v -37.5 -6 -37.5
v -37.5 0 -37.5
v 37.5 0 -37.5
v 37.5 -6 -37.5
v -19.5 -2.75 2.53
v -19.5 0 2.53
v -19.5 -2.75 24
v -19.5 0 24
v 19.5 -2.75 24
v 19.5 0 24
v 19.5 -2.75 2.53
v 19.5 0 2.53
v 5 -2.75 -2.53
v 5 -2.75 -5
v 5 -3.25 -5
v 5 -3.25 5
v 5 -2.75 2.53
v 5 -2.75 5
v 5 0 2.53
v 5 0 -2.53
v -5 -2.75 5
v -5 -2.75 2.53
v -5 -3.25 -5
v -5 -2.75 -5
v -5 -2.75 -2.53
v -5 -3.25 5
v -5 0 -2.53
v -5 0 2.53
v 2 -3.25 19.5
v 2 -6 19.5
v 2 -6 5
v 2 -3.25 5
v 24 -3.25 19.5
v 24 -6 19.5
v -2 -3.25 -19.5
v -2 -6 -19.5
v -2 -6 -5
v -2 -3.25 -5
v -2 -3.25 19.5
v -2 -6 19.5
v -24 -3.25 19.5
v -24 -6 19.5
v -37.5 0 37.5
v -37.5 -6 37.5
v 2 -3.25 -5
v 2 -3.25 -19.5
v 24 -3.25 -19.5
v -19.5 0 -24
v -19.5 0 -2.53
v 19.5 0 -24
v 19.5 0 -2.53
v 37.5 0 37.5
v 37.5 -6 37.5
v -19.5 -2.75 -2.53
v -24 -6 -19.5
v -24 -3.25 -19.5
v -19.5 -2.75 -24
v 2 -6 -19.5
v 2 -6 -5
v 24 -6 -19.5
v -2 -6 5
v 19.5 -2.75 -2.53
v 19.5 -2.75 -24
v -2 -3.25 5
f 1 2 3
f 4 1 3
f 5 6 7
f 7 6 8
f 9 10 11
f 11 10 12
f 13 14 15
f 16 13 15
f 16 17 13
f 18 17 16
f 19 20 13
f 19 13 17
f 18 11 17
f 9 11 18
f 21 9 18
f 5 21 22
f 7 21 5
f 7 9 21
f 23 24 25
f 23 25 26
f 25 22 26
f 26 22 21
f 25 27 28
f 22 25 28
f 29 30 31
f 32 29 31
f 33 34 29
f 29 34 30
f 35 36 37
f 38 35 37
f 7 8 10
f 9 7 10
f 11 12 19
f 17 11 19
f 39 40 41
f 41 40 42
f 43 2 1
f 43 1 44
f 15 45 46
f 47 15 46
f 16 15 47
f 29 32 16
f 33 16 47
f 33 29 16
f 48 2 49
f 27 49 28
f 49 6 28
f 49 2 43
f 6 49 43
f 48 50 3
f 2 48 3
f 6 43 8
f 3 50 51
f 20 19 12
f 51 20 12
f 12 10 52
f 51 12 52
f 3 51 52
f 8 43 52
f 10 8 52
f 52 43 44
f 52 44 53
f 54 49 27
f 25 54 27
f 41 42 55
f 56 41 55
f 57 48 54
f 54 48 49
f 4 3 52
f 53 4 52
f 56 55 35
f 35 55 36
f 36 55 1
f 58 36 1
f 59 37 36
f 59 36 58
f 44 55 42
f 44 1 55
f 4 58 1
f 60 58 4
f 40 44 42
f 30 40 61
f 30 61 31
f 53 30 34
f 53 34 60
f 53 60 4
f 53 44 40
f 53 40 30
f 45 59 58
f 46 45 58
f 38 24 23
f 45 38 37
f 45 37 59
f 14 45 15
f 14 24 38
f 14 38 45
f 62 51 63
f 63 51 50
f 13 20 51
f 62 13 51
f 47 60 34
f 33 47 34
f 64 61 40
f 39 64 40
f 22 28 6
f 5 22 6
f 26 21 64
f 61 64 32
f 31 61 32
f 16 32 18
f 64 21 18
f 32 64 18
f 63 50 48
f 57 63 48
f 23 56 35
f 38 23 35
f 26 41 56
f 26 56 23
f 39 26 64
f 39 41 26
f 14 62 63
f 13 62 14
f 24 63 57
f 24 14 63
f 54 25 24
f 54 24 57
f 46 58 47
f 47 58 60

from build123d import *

# Parameters (mm, degrees)
F0_W     = 75
F0_H     = 75
F0_W_2   = 10
F0_H_2   = 10
F1_DEPTH = 6
F3_DEPTH = 2.75
F5_DEPTH = 2.75


# Not quite as in the source:
# - a feature names something its author has since deleted; it is built from what else it names


with BuildPart() as f1:
    # F0 (on Front) → F1 (new body)
    with BuildSketch(Plane.XZ):
        Rectangle(F0_W, F0_H)
        Rectangle(F0_W_2, F0_H_2, mode=Mode.SUBTRACT)
    extrude(amount=F1_DEPTH)

    # F2 (on face) → F3 (cut)
    with BuildSketch(Plane.XZ.offset(6)):
        Polygon((-24, -19.5), (-2, -19.5), (-2, -5), (-5, -5), (-5, 5), (-2, 5), (-2, 19.5), (-24, 19.5), align=None)
        Polygon((2, -19.5), (24, -19.5), (24, 19.5), (2, 19.5), (2, 5), (5, 5), (5, -5), (2, -5), align=None)
    extrude(amount=-F3_DEPTH, mode=Mode.SUBTRACT)

    # F4 (on face) → F5 (cut)
    with BuildSketch(Plane(origin=(0, 0, 0), x_dir=(-1, 0, 0), z_dir=(0, 1, 0))):
        Polygon((-19.5, -24), (19.5, -24), (19.5, -2.5302600116), (5, -2.5302600116), (5, -5), (-5, -5), (-5, -2.5302600116), (-19.5, -2.5302600116), align=None)
        Polygon((5, 2.5302600116), (19.5, 2.5302600116), (19.5, 24), (-19.5, 24), (-19.5, 2.5302600116), (-5, 2.5302600116), (-5, 5), (5, 5), align=None)
    extrude(amount=-F5_DEPTH, mode=Mode.SUBTRACT)


solid = f1.part
